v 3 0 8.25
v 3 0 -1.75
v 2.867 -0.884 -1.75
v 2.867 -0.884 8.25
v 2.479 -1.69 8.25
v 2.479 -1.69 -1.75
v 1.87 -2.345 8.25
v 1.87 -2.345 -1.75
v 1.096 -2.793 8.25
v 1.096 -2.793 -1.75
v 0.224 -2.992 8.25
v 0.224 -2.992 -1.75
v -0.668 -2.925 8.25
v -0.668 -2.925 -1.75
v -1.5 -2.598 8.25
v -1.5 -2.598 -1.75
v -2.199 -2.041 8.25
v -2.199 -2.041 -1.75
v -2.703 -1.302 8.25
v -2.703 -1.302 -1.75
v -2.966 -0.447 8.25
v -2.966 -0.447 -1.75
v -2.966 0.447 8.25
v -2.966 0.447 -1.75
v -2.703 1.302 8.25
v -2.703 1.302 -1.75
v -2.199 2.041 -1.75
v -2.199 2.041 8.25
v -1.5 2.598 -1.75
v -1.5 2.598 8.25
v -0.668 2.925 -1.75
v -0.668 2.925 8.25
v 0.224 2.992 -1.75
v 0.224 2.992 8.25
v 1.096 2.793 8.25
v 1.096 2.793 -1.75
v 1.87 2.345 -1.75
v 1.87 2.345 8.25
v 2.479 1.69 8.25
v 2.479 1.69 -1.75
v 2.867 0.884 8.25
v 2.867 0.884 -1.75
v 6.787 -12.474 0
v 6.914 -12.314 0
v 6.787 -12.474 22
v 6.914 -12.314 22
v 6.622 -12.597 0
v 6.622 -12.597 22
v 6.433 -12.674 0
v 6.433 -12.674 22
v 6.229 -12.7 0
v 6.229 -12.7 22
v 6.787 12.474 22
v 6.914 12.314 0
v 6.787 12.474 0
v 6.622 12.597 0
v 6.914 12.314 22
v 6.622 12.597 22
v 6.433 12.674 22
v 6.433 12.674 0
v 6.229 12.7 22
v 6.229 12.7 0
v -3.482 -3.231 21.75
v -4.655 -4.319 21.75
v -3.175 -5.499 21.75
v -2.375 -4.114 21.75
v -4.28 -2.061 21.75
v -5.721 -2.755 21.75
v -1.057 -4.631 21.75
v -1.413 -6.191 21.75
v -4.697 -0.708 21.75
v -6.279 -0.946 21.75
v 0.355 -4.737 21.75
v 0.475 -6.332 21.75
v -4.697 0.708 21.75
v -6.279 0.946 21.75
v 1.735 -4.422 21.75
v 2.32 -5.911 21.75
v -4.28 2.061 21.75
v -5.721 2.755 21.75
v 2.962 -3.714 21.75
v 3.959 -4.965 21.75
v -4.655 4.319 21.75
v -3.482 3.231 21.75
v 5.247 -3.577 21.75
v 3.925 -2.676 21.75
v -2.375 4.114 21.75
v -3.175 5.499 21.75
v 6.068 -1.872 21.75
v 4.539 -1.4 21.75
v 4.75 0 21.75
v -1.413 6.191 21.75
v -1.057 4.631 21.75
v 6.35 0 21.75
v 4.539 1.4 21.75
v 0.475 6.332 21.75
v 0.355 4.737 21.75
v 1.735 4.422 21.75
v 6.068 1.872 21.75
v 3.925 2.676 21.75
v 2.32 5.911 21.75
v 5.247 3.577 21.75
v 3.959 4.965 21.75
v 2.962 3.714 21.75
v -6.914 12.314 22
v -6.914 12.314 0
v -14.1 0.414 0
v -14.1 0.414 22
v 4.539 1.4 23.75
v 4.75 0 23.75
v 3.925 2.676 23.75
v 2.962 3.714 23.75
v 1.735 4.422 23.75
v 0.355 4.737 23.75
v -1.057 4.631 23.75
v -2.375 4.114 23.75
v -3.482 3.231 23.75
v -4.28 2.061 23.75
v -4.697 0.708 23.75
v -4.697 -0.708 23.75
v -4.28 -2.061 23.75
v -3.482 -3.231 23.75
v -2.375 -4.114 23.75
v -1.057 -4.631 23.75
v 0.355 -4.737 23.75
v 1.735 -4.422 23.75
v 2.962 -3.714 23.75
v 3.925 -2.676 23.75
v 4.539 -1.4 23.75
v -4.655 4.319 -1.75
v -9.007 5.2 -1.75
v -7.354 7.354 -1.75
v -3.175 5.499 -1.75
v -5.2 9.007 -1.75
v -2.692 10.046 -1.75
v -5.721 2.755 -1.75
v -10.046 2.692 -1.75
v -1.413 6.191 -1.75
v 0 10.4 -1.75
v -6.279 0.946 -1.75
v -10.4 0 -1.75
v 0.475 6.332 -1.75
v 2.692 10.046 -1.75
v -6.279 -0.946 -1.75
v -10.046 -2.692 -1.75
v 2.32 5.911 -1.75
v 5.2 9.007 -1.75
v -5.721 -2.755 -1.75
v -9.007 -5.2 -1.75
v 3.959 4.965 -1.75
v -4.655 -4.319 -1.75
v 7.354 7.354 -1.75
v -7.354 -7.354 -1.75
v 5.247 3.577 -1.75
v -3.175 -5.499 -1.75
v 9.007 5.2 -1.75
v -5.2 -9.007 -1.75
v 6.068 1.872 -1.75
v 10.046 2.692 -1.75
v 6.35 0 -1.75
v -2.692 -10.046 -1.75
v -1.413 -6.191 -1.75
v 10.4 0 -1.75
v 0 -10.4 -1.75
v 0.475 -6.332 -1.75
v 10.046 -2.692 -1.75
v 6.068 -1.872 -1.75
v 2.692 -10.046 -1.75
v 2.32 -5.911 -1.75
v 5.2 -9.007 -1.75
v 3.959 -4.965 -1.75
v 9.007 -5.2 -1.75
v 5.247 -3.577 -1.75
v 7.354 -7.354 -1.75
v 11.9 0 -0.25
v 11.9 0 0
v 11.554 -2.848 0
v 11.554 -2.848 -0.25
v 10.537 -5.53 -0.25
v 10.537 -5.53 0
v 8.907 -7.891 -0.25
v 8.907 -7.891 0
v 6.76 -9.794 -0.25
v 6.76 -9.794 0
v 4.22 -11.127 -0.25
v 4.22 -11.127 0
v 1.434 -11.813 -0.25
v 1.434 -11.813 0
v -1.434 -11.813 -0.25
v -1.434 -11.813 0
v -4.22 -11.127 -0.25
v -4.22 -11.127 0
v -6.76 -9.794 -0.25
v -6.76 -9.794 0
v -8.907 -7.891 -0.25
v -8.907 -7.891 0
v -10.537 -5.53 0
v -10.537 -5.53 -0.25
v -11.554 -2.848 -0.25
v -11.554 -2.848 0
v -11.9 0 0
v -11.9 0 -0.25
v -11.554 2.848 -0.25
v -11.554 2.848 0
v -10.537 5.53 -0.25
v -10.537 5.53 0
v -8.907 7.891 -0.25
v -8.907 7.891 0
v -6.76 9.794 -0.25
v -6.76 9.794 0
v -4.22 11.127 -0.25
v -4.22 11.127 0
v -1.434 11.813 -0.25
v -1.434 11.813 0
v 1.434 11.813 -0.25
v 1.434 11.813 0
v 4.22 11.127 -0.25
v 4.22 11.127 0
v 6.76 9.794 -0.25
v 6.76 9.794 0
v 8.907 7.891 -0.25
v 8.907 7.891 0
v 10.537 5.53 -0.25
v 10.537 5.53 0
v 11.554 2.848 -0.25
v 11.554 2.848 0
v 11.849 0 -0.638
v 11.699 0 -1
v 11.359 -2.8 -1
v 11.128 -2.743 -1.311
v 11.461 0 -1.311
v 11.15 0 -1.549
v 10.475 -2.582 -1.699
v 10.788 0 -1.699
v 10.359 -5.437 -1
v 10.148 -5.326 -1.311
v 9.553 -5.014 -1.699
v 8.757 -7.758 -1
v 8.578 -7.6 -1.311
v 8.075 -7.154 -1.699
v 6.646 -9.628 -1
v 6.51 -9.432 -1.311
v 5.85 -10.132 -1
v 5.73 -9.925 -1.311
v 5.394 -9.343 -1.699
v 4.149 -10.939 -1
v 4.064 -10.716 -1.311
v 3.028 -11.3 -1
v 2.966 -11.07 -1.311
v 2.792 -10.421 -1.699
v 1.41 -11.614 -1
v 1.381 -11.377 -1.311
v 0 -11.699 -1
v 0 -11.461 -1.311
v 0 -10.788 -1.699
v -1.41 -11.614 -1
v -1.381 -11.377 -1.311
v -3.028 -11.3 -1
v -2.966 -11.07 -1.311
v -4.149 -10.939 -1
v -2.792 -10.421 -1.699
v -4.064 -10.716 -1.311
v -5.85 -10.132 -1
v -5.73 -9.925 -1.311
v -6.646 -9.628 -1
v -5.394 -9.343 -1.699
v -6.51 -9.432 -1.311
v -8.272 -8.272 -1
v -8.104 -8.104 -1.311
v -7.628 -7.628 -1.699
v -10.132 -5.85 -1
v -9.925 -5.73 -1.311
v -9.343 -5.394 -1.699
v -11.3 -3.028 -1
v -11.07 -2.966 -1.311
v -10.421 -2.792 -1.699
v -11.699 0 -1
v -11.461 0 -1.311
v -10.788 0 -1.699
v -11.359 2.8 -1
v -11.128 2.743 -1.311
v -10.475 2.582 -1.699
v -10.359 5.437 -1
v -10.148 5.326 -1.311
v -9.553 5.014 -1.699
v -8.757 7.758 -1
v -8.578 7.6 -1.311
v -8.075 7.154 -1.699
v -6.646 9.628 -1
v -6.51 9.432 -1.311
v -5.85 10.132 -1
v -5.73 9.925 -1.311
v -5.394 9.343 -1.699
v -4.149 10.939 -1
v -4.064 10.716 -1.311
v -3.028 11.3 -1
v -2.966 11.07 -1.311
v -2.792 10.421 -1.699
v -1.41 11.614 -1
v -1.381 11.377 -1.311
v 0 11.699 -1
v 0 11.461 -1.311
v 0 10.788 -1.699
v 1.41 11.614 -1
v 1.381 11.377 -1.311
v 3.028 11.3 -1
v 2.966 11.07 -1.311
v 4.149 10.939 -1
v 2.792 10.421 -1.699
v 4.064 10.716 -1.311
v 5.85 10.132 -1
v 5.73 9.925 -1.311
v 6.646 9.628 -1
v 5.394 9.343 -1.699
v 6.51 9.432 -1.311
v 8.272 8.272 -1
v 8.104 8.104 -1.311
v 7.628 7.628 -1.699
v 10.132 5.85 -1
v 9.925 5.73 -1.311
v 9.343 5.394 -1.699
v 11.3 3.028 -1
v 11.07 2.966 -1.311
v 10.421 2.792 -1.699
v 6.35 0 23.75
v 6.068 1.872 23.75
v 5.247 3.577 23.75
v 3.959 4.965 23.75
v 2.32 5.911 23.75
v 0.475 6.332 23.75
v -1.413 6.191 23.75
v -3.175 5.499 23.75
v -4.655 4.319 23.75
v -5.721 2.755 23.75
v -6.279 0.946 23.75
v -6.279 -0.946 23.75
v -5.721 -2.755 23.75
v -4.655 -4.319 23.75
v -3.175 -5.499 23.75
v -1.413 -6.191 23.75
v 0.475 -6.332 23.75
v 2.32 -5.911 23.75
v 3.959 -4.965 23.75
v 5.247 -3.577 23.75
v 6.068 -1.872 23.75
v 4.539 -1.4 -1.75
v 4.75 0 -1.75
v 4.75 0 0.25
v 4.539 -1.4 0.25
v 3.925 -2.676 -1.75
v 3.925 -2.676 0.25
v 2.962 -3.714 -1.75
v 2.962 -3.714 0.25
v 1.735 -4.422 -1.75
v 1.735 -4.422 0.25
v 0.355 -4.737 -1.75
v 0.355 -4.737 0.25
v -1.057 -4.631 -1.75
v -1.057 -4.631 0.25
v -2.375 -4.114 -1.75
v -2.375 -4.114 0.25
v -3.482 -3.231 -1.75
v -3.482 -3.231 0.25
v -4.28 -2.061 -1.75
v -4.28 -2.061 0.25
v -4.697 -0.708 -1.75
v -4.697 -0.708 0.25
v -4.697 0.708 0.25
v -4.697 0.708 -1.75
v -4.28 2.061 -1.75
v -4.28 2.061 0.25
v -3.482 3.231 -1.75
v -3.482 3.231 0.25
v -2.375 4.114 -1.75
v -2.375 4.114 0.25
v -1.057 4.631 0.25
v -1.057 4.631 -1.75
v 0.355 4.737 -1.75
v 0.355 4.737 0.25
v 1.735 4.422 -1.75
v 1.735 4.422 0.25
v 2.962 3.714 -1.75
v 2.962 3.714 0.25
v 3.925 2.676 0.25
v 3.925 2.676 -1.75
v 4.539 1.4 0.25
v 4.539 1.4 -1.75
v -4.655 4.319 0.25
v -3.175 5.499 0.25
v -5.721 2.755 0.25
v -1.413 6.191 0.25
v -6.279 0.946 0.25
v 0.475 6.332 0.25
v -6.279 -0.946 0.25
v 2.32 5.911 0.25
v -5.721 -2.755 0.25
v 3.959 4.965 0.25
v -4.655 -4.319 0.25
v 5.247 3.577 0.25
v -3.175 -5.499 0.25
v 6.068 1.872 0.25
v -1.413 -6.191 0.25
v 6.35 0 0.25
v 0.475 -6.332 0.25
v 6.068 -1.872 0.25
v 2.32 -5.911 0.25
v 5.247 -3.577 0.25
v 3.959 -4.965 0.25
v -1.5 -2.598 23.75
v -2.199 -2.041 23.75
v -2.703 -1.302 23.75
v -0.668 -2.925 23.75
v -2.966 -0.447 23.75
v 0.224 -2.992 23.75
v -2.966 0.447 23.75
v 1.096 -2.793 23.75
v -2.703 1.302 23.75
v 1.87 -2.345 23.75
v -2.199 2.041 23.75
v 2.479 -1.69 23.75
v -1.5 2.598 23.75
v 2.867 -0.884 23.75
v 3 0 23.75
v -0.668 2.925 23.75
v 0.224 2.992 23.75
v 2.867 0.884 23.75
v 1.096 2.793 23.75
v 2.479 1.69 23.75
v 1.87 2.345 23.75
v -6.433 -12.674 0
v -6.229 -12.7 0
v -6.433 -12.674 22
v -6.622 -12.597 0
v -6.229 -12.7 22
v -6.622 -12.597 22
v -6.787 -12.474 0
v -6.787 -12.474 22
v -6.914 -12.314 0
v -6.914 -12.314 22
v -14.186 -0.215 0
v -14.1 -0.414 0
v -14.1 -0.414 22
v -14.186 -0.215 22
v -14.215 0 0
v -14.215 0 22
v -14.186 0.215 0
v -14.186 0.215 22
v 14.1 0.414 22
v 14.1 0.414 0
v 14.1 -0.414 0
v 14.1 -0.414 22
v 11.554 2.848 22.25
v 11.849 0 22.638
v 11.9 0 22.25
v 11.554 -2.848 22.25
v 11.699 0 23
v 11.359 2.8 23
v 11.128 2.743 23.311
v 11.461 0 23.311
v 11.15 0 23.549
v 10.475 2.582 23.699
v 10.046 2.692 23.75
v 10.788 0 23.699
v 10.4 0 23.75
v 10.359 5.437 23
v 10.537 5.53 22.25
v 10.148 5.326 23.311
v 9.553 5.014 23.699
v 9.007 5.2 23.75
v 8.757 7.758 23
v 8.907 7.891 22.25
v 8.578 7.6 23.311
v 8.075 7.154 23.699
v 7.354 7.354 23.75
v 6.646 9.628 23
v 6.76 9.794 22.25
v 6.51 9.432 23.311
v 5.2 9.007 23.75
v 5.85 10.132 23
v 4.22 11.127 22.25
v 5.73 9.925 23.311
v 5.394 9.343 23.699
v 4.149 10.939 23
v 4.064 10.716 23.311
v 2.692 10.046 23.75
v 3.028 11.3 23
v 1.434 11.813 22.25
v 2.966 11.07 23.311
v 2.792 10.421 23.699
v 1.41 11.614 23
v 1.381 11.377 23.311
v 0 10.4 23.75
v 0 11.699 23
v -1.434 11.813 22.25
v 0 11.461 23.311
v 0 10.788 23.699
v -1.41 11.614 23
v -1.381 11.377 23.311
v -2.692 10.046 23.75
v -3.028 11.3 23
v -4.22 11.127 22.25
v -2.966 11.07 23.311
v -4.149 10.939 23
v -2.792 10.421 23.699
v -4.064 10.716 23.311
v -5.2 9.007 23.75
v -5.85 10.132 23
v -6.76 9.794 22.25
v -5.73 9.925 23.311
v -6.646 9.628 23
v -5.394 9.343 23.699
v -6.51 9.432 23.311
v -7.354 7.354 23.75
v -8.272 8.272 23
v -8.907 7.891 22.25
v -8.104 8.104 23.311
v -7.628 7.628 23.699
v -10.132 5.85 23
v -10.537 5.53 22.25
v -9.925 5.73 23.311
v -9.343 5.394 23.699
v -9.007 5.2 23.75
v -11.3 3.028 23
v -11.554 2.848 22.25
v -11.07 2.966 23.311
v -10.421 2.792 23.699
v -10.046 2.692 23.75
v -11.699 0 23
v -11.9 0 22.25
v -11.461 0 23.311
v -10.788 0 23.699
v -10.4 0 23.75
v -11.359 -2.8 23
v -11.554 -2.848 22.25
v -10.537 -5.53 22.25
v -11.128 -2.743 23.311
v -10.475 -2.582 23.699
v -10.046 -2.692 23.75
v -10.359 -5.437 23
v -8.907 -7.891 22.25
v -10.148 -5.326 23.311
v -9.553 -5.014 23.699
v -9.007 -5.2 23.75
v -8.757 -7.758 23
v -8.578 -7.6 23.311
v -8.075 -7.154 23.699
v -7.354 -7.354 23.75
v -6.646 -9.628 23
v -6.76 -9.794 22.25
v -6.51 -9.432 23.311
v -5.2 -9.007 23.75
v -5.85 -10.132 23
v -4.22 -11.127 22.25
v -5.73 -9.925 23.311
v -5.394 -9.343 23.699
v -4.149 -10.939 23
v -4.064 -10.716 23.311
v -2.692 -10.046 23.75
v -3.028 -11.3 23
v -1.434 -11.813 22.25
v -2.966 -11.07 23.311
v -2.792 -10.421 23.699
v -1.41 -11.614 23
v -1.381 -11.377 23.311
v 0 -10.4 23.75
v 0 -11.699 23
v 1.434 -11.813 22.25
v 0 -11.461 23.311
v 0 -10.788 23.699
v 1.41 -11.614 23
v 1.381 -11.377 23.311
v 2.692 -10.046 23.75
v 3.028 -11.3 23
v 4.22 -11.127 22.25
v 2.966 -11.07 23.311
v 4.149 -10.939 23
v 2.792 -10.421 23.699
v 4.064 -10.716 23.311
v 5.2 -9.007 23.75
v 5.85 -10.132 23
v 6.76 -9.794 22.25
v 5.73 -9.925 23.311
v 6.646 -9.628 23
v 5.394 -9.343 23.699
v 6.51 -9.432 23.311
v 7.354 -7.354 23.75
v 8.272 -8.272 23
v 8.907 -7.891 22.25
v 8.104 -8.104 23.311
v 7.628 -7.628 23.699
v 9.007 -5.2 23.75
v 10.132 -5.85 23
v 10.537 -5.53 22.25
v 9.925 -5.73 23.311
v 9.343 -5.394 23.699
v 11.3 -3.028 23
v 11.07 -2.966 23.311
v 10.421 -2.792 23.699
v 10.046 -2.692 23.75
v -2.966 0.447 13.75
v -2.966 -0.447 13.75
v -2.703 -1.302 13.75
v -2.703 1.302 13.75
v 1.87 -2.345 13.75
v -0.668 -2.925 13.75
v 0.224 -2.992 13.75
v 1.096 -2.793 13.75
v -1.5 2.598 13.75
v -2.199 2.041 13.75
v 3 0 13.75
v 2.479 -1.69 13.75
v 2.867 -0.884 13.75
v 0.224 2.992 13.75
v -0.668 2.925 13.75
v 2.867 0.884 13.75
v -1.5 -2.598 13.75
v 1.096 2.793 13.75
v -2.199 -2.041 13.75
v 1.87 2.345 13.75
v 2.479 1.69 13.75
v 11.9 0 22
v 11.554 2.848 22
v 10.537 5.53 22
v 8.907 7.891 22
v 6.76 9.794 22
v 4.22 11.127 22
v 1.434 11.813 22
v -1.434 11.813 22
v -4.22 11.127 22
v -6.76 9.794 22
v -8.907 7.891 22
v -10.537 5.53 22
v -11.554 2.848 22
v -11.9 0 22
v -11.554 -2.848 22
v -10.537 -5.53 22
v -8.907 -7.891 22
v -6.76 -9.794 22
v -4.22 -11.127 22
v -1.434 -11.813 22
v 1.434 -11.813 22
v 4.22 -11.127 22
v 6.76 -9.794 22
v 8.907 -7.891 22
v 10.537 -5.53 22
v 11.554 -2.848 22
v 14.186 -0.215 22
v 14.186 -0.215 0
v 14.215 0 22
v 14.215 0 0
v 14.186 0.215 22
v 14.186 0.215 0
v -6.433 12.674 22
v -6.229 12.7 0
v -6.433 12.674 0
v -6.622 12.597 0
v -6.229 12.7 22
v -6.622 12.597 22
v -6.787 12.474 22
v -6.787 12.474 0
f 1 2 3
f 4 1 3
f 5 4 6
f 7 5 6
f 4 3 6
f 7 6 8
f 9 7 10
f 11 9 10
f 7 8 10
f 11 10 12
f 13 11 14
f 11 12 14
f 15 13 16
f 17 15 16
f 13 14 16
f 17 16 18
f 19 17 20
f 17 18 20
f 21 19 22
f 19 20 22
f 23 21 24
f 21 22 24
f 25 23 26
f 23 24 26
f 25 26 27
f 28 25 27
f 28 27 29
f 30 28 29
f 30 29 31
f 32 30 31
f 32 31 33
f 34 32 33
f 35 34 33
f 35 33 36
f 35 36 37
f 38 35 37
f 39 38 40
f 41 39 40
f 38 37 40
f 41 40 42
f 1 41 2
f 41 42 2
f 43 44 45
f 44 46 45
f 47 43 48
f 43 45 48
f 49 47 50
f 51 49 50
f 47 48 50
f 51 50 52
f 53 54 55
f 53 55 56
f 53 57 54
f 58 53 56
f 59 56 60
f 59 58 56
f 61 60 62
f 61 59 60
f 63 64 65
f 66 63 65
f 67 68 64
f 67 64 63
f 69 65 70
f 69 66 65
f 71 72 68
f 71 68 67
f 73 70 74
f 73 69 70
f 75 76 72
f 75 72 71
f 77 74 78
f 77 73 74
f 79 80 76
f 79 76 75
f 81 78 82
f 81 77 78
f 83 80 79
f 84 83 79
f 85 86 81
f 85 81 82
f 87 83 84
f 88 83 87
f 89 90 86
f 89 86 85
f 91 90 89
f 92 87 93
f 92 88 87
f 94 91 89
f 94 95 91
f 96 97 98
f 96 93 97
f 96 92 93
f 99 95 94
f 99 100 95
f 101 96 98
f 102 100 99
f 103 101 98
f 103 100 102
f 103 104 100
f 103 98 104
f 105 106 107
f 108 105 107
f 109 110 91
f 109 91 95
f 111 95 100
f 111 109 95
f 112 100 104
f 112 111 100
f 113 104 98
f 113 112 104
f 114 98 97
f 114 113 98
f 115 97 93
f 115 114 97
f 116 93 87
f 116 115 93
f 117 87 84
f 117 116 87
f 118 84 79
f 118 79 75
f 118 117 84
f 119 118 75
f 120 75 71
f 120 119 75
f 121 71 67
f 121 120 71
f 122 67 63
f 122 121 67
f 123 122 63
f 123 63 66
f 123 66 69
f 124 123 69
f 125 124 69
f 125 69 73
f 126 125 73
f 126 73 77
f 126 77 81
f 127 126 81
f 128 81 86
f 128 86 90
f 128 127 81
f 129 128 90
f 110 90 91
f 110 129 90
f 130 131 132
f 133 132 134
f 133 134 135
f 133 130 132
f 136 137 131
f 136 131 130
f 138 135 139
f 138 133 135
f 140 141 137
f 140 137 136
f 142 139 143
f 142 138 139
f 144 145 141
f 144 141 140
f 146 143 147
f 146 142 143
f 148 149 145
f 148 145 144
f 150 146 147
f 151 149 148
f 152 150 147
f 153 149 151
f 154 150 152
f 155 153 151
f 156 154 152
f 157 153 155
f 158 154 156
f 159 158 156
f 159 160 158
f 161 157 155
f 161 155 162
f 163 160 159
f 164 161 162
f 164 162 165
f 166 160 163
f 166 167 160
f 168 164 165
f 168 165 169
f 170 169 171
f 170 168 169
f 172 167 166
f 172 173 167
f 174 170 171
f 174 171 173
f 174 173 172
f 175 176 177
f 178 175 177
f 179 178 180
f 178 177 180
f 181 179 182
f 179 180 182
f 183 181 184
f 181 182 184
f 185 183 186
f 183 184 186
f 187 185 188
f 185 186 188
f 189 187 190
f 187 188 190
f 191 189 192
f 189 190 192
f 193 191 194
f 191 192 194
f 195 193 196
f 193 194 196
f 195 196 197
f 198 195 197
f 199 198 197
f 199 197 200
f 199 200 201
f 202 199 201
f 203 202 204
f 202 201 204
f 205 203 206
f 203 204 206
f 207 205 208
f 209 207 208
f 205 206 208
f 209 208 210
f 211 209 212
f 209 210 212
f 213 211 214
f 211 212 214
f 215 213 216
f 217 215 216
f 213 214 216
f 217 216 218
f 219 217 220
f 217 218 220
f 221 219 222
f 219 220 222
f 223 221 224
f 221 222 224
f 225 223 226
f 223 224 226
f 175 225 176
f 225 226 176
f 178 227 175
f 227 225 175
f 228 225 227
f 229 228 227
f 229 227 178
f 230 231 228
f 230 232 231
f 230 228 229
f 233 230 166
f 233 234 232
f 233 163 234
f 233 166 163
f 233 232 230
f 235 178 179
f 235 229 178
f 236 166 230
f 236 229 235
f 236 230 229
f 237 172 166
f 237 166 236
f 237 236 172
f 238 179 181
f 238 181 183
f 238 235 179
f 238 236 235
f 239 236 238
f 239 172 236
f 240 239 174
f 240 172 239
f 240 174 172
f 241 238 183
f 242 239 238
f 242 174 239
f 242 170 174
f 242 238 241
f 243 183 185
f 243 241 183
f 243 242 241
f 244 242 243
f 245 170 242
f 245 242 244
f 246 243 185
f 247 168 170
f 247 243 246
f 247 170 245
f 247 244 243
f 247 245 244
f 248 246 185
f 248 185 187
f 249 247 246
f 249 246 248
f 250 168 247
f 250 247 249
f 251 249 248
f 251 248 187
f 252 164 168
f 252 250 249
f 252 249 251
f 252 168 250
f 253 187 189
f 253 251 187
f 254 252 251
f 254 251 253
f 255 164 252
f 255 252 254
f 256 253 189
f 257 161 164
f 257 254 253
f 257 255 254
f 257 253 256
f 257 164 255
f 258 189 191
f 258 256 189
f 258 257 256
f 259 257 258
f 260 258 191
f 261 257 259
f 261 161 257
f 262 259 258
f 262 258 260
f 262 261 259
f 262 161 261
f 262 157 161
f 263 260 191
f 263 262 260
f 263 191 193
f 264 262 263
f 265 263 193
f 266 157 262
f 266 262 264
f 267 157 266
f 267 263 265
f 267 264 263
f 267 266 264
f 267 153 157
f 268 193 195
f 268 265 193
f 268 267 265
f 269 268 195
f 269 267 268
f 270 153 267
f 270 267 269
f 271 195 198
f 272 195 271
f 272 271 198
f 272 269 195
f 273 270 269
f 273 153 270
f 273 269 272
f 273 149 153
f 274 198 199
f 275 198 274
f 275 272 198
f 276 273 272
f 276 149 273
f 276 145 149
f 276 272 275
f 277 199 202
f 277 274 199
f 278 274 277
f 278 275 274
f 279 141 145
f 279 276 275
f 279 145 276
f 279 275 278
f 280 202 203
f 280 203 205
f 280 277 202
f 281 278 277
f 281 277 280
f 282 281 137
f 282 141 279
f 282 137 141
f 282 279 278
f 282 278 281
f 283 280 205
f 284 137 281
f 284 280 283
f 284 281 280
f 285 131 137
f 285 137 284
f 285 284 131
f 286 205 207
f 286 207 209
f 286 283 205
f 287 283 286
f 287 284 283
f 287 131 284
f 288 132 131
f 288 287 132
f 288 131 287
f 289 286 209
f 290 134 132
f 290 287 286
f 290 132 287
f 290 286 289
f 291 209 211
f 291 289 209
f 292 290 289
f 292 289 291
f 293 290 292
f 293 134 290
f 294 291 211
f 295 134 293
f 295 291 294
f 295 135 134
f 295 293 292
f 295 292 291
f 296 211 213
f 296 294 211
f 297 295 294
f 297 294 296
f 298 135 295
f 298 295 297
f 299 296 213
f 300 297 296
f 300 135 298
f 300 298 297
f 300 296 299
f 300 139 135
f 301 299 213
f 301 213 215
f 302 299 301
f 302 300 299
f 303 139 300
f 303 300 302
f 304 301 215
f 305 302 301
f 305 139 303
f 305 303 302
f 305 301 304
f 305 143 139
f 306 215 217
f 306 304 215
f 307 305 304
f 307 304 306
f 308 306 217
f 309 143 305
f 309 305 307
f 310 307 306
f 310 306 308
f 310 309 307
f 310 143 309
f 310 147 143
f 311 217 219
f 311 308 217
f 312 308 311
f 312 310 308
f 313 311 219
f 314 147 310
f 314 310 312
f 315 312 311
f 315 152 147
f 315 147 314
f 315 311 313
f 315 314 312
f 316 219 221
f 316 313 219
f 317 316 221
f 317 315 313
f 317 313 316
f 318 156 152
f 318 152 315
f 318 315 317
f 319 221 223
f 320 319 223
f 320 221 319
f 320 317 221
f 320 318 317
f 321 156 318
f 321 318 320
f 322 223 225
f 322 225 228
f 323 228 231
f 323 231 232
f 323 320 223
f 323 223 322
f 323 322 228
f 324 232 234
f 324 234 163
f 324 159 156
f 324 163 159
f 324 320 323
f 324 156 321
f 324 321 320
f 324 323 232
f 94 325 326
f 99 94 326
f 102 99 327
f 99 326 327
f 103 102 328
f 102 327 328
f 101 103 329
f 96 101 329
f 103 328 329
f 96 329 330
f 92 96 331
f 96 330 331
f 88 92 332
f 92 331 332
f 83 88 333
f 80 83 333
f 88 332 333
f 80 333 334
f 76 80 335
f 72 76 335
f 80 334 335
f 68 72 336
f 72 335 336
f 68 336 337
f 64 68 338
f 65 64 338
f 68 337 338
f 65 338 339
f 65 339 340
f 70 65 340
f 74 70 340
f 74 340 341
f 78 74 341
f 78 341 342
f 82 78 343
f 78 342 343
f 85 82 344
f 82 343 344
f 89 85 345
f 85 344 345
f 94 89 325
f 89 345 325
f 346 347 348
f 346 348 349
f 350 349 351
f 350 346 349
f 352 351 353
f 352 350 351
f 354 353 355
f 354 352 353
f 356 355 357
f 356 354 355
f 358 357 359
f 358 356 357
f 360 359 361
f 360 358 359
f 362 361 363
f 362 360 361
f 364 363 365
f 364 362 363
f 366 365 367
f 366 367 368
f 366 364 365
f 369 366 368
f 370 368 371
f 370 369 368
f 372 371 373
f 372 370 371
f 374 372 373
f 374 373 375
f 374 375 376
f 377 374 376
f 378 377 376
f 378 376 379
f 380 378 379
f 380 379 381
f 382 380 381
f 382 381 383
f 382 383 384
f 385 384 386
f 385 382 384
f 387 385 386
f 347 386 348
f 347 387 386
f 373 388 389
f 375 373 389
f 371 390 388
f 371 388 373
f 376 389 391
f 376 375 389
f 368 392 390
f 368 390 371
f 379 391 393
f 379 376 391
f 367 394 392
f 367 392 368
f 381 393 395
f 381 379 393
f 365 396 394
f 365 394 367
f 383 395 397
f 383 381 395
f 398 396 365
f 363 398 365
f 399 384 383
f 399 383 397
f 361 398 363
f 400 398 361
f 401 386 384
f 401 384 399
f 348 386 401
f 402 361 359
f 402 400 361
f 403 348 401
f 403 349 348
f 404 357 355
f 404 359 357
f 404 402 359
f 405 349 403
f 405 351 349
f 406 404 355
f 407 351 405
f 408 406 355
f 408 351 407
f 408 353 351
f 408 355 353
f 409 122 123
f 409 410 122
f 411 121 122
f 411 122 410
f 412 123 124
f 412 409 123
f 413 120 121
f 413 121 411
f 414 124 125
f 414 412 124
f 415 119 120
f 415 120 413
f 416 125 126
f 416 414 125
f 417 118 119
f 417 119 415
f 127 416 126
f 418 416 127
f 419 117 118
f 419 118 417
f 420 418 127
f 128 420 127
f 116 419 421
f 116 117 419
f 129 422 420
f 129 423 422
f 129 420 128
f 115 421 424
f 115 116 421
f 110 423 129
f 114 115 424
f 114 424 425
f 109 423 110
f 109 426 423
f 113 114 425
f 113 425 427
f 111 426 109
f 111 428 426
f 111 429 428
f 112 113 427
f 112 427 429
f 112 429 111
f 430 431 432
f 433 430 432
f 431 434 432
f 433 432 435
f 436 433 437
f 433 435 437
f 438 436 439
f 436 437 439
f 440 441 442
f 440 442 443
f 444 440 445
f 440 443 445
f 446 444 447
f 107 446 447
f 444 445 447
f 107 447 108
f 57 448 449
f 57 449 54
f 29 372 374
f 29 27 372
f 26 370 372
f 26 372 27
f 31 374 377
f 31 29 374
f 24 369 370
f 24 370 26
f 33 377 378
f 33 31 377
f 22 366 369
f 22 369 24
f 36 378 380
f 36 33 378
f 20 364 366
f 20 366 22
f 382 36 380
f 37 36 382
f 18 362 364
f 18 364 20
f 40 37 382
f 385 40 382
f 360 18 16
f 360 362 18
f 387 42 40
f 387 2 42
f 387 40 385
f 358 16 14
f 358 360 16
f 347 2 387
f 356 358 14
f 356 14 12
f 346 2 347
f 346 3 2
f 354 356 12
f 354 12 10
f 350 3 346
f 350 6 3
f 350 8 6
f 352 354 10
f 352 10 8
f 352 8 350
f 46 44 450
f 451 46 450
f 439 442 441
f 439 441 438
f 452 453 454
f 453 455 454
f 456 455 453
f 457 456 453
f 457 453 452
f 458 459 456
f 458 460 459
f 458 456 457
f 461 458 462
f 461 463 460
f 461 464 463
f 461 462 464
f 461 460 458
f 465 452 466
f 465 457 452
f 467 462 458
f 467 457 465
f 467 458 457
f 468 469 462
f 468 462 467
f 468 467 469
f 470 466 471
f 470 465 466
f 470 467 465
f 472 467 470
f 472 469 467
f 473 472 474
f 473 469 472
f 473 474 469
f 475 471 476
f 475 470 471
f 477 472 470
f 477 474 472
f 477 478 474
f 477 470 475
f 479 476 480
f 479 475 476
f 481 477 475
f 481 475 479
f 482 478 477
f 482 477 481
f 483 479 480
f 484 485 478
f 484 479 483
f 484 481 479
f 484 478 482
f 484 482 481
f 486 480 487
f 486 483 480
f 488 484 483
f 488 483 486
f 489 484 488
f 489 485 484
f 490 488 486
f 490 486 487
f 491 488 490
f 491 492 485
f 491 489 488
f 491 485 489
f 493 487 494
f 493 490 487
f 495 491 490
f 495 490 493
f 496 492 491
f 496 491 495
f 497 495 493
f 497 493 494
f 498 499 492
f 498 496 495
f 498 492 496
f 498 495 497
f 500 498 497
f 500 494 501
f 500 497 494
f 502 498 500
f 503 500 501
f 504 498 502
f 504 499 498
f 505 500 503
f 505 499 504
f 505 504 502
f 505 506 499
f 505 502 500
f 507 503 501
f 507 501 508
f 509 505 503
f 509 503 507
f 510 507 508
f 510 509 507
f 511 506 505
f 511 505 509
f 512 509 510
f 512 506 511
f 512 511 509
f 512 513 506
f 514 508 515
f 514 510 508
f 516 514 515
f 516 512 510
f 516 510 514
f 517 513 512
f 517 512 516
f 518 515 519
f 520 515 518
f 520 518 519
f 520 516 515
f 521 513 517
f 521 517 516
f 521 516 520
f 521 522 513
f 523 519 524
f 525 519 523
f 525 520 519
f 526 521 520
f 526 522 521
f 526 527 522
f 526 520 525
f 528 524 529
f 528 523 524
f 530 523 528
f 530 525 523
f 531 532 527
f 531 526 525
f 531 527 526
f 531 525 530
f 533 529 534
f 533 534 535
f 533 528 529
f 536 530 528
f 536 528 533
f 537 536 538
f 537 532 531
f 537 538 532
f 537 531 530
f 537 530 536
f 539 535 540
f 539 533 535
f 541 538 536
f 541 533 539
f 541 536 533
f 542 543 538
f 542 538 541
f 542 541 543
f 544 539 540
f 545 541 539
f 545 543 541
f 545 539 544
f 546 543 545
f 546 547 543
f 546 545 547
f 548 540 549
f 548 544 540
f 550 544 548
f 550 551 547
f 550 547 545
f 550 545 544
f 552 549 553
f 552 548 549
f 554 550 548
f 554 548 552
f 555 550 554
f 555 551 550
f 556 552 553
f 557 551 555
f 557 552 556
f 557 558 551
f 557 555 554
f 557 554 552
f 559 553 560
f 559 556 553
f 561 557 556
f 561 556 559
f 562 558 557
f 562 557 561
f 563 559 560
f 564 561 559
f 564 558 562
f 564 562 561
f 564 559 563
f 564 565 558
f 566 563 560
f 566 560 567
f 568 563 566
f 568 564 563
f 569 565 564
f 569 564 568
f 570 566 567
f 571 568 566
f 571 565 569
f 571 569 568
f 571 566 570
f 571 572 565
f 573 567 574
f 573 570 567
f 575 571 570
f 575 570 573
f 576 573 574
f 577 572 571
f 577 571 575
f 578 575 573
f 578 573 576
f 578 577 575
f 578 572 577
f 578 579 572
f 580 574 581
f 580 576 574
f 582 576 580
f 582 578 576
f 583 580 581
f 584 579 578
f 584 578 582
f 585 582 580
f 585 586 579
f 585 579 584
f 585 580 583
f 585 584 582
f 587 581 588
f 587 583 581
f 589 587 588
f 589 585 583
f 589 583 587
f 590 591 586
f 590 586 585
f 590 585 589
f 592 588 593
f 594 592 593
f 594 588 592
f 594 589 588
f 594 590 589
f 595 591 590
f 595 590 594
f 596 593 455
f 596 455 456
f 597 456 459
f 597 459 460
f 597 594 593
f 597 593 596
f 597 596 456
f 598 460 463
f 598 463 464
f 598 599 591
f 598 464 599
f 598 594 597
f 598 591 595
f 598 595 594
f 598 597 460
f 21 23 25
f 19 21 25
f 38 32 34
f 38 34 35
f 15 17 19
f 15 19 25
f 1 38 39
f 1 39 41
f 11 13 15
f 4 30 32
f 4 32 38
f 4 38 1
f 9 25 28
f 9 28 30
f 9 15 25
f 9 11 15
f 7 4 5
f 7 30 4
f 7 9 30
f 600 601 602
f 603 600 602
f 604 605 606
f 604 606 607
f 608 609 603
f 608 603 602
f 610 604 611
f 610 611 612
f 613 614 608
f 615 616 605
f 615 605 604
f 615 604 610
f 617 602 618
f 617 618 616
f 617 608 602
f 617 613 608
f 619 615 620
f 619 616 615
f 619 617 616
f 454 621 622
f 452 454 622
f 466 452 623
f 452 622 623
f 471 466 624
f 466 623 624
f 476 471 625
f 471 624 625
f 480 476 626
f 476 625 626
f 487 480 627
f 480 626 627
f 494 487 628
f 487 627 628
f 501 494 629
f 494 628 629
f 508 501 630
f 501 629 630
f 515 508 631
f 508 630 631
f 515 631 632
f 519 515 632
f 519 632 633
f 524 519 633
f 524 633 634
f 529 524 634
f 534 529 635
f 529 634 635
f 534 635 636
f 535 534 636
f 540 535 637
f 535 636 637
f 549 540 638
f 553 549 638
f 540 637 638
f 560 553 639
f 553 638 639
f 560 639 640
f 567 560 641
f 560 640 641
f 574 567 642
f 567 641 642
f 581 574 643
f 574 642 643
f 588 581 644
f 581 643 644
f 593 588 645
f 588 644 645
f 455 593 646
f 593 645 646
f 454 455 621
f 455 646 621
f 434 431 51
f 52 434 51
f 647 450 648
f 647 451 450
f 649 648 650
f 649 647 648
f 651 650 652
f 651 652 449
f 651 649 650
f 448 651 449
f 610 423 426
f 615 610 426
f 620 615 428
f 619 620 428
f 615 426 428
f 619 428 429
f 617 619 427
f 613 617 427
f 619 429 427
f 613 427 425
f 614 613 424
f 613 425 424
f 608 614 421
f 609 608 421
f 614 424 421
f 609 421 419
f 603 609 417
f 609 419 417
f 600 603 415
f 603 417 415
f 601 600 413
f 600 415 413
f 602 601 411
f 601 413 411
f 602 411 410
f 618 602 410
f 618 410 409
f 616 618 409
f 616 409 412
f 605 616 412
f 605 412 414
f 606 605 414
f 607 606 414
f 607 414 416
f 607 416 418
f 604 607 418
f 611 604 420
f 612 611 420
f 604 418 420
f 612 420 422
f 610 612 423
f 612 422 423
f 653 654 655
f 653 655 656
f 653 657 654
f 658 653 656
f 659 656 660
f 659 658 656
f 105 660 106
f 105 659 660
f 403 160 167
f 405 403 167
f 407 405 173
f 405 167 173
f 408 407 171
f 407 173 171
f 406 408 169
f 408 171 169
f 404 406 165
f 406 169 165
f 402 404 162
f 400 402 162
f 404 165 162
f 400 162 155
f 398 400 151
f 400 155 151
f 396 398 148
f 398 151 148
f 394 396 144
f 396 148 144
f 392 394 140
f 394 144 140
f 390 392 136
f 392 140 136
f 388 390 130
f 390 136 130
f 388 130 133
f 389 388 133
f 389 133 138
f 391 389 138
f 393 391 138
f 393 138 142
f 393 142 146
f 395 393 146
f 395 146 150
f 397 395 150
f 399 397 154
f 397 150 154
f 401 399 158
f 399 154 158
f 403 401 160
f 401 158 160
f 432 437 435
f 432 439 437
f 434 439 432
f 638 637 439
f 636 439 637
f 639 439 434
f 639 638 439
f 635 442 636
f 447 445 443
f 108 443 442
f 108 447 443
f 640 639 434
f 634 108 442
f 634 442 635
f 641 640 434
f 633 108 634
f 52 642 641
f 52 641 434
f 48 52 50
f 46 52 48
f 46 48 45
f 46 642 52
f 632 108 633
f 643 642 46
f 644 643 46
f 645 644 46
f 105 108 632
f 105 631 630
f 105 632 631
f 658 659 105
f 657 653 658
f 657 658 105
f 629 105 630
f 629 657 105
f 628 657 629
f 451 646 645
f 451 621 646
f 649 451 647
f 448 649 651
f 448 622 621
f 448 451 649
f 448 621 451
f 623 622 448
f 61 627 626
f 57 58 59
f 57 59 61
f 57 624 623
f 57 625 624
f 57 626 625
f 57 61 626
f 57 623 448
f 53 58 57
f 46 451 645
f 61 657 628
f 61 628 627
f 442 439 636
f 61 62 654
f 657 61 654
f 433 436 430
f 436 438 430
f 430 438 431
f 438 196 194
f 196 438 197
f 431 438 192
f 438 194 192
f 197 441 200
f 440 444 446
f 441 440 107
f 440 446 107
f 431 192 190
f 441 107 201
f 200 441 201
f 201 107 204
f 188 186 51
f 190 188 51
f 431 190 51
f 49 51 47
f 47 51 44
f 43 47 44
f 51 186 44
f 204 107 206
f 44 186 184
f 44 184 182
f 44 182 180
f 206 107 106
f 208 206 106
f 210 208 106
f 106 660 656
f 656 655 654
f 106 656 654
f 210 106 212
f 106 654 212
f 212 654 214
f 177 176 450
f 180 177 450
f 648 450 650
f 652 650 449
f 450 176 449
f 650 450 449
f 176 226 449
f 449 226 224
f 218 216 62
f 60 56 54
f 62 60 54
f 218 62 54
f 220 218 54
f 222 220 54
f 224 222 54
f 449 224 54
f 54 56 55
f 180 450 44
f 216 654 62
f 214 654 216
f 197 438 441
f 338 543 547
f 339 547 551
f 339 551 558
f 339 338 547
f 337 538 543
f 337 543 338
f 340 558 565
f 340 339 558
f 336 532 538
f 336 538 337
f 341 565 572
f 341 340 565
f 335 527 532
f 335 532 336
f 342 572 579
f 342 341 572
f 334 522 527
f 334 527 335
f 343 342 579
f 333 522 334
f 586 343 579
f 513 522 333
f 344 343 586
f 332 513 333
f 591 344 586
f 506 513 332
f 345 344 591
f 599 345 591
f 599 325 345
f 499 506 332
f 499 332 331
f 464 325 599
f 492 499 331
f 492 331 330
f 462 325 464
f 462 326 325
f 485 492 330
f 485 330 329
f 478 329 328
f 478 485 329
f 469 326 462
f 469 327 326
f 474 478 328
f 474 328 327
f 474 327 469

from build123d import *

# Parameters (mm, degrees)
F1_DEPTH  = 22
F2_R      = 11.9
F3_DEPTH  = 1.75
F4_R      = 11.9
F5_DEPTH  = 1.75
F6_R      = 6.35
F6_R_2    = 4.75
F8_DEPTH  = 2
F7_R      = 6.35
F7_R_2    = 4.75
F9_DEPTH  = 2
F7_R_3    = 3
F10_DEPTH = 10
F6_R_3    = 3
F11_DEPTH = 10
F12_R     = 1.5
F13_R     = 0.8


with BuildPart() as f1:
    # F0 (on Top) → F1 (new body)
    with BuildSketch(Plane.XY):
        Polygon((6.680756, -12.7), (14.35, 0), (6.680756, 12.7), (-6.680756, 12.7), (-14.35, 0), (-6.680756, -12.7), align=None)
    extrude(amount=F1_DEPTH)

    # F2 (on face) → F3 (join)
    with BuildSketch(Plane.XY.offset(22)):
        Circle(F2_R)
    extrude(amount=F3_DEPTH)

    # F4 (on face) → F5 (join)
    with BuildSketch(Plane(origin=(0, 0, 0), x_dir=(1, 0, 0), z_dir=(0, 0, -1))):
        Circle(F4_R)
    extrude(amount=F5_DEPTH)

    # F6 (on face) → F8 (cut)
    with BuildSketch(Plane.XY.offset(23.75)):
        Circle(F6_R)
        Circle(F6_R_2, mode=Mode.SUBTRACT)
    extrude(amount=-F8_DEPTH, mode=Mode.SUBTRACT)

    # F7 (on face) → F9 (cut)
    with BuildSketch(Plane(origin=(0, 0, -1.75), x_dir=(1, 0, 0), z_dir=(0, 0, -1))):
        Circle(F7_R)
        Circle(F7_R_2, mode=Mode.SUBTRACT)
    extrude(amount=-F9_DEPTH, mode=Mode.SUBTRACT)

    # F7 (on face) → F10 (cut)
    with BuildSketch(Plane(origin=(0, 0, -1.75), x_dir=(1, 0, 0), z_dir=(0, 0, -1))):
        Circle(F7_R_3)
    extrude(amount=-F10_DEPTH, mode=Mode.SUBTRACT)

    # F6 (on face) → F11 (cut)
    with BuildSketch(Plane.XY.offset(23.75)):
        Circle(F6_R_3)
    extrude(amount=-F11_DEPTH, mode=Mode.SUBTRACT)

    # F12
    f12_edges = [f1.edges().sort_by_distance(p)[0] for p in [
        (-11.9, 0, 23.75),
        (-11.9, 0, -1.75),
    ]]
    fillet(f12_edges, radius=F12_R)

    # F13
    f13_edges = [f1.edges().sort_by_distance(p)[0] for p in [
        (-6.680756, 12.7, 11),
        (6.680756, 12.7, 11),
        (14.35, 0, 11),
        (6.680756, -12.7, 11),
        (-6.680756, -12.7, 11),
        (-14.35, 0, 11),
    ]]
    fillet(f13_edges, radius=F13_R)


solid = f1.part
